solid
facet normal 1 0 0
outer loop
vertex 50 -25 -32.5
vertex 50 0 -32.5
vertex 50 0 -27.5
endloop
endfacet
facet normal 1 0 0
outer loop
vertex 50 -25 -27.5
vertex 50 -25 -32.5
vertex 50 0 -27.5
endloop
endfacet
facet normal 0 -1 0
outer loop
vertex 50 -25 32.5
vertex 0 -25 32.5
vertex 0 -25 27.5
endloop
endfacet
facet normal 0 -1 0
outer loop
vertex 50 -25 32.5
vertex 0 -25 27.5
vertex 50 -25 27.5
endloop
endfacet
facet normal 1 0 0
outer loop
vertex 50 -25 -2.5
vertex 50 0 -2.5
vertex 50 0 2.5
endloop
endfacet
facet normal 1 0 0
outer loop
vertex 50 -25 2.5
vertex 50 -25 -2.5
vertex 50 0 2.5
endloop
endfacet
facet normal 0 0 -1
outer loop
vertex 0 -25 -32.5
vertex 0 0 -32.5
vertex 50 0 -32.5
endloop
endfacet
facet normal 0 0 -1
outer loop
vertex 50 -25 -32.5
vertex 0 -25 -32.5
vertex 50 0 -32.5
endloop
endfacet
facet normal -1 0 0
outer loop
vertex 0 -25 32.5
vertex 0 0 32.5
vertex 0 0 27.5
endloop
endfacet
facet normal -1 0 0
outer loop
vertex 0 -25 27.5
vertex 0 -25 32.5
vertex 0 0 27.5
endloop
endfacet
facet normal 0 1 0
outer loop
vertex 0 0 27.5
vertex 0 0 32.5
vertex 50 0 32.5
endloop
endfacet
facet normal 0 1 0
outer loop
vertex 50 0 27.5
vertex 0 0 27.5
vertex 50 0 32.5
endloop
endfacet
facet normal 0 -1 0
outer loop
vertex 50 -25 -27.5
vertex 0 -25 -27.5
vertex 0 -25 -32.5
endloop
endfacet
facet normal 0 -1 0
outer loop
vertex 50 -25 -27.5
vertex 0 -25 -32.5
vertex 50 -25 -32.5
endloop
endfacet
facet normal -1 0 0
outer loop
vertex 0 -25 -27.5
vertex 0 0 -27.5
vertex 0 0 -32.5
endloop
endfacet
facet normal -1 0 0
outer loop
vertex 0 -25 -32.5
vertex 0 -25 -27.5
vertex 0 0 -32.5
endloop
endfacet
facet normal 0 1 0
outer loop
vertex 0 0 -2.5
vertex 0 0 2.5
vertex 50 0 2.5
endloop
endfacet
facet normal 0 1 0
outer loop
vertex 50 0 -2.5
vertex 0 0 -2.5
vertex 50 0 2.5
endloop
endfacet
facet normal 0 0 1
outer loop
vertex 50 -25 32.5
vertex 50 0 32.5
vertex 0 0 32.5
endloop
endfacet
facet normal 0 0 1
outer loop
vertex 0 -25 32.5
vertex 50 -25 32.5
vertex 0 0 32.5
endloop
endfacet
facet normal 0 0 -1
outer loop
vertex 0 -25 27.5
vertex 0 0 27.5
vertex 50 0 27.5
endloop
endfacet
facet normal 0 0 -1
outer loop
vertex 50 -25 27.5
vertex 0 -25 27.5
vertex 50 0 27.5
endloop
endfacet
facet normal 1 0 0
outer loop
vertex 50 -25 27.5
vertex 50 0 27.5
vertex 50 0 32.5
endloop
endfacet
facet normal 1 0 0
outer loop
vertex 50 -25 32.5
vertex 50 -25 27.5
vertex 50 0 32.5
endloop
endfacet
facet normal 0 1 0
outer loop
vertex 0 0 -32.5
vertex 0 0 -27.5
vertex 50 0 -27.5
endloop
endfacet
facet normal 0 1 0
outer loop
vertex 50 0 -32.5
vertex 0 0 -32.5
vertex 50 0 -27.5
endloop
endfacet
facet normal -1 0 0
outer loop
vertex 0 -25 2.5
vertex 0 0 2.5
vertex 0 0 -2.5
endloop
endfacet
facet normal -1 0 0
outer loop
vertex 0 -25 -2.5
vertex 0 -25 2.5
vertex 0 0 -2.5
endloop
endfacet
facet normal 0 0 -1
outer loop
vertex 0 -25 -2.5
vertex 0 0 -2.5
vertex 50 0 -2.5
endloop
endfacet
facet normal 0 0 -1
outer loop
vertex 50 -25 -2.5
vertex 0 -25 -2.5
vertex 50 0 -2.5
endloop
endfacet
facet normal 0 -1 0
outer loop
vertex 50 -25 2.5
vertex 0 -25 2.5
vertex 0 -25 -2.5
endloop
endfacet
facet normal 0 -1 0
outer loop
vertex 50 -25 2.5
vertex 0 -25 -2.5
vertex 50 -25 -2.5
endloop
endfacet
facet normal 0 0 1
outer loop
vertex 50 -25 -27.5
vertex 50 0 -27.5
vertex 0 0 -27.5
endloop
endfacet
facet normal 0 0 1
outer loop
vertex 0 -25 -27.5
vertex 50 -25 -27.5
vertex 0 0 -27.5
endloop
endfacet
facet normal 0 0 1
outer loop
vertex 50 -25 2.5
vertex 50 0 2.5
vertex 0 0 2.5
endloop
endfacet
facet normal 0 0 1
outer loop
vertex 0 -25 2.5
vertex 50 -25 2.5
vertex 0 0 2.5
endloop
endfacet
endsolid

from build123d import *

# Parameters (mm, degrees)
F1_DEPTH = 25
F2_DEPTH = 25
F3_DEPTH = 25


with BuildPart() as f1:
    # F0 (on Front) → F1 (new body)
    with BuildSketch(Plane.XZ):
        Polygon((0, -27.5), (0, -32.5), (50, -32.5), (50, -27.5), (5, -27.5), align=None)
    extrude(amount=F1_DEPTH)


with BuildPart() as f2:
    # F0 (on Front) → F2 (new body, through all)
    with BuildSketch(Plane.XZ):
        Polygon((0, 2.5), (0, -2.5), (5, -2.5), (50, -2.5), (50, 2.5), (5, 2.5), align=None)
    extrude(amount=F2_DEPTH)


with BuildPart() as f3:
    # F0 (on Front) → F3 (new body, through all)
    with BuildSketch(Plane.XZ):
        Polygon((0, 32.5), (0, 27.5), (5, 27.5), (50, 27.5), (50, 32.5), align=None)
    extrude(amount=F3_DEPTH)


solid = Compound([f1.part, f2.part, f3.part])
